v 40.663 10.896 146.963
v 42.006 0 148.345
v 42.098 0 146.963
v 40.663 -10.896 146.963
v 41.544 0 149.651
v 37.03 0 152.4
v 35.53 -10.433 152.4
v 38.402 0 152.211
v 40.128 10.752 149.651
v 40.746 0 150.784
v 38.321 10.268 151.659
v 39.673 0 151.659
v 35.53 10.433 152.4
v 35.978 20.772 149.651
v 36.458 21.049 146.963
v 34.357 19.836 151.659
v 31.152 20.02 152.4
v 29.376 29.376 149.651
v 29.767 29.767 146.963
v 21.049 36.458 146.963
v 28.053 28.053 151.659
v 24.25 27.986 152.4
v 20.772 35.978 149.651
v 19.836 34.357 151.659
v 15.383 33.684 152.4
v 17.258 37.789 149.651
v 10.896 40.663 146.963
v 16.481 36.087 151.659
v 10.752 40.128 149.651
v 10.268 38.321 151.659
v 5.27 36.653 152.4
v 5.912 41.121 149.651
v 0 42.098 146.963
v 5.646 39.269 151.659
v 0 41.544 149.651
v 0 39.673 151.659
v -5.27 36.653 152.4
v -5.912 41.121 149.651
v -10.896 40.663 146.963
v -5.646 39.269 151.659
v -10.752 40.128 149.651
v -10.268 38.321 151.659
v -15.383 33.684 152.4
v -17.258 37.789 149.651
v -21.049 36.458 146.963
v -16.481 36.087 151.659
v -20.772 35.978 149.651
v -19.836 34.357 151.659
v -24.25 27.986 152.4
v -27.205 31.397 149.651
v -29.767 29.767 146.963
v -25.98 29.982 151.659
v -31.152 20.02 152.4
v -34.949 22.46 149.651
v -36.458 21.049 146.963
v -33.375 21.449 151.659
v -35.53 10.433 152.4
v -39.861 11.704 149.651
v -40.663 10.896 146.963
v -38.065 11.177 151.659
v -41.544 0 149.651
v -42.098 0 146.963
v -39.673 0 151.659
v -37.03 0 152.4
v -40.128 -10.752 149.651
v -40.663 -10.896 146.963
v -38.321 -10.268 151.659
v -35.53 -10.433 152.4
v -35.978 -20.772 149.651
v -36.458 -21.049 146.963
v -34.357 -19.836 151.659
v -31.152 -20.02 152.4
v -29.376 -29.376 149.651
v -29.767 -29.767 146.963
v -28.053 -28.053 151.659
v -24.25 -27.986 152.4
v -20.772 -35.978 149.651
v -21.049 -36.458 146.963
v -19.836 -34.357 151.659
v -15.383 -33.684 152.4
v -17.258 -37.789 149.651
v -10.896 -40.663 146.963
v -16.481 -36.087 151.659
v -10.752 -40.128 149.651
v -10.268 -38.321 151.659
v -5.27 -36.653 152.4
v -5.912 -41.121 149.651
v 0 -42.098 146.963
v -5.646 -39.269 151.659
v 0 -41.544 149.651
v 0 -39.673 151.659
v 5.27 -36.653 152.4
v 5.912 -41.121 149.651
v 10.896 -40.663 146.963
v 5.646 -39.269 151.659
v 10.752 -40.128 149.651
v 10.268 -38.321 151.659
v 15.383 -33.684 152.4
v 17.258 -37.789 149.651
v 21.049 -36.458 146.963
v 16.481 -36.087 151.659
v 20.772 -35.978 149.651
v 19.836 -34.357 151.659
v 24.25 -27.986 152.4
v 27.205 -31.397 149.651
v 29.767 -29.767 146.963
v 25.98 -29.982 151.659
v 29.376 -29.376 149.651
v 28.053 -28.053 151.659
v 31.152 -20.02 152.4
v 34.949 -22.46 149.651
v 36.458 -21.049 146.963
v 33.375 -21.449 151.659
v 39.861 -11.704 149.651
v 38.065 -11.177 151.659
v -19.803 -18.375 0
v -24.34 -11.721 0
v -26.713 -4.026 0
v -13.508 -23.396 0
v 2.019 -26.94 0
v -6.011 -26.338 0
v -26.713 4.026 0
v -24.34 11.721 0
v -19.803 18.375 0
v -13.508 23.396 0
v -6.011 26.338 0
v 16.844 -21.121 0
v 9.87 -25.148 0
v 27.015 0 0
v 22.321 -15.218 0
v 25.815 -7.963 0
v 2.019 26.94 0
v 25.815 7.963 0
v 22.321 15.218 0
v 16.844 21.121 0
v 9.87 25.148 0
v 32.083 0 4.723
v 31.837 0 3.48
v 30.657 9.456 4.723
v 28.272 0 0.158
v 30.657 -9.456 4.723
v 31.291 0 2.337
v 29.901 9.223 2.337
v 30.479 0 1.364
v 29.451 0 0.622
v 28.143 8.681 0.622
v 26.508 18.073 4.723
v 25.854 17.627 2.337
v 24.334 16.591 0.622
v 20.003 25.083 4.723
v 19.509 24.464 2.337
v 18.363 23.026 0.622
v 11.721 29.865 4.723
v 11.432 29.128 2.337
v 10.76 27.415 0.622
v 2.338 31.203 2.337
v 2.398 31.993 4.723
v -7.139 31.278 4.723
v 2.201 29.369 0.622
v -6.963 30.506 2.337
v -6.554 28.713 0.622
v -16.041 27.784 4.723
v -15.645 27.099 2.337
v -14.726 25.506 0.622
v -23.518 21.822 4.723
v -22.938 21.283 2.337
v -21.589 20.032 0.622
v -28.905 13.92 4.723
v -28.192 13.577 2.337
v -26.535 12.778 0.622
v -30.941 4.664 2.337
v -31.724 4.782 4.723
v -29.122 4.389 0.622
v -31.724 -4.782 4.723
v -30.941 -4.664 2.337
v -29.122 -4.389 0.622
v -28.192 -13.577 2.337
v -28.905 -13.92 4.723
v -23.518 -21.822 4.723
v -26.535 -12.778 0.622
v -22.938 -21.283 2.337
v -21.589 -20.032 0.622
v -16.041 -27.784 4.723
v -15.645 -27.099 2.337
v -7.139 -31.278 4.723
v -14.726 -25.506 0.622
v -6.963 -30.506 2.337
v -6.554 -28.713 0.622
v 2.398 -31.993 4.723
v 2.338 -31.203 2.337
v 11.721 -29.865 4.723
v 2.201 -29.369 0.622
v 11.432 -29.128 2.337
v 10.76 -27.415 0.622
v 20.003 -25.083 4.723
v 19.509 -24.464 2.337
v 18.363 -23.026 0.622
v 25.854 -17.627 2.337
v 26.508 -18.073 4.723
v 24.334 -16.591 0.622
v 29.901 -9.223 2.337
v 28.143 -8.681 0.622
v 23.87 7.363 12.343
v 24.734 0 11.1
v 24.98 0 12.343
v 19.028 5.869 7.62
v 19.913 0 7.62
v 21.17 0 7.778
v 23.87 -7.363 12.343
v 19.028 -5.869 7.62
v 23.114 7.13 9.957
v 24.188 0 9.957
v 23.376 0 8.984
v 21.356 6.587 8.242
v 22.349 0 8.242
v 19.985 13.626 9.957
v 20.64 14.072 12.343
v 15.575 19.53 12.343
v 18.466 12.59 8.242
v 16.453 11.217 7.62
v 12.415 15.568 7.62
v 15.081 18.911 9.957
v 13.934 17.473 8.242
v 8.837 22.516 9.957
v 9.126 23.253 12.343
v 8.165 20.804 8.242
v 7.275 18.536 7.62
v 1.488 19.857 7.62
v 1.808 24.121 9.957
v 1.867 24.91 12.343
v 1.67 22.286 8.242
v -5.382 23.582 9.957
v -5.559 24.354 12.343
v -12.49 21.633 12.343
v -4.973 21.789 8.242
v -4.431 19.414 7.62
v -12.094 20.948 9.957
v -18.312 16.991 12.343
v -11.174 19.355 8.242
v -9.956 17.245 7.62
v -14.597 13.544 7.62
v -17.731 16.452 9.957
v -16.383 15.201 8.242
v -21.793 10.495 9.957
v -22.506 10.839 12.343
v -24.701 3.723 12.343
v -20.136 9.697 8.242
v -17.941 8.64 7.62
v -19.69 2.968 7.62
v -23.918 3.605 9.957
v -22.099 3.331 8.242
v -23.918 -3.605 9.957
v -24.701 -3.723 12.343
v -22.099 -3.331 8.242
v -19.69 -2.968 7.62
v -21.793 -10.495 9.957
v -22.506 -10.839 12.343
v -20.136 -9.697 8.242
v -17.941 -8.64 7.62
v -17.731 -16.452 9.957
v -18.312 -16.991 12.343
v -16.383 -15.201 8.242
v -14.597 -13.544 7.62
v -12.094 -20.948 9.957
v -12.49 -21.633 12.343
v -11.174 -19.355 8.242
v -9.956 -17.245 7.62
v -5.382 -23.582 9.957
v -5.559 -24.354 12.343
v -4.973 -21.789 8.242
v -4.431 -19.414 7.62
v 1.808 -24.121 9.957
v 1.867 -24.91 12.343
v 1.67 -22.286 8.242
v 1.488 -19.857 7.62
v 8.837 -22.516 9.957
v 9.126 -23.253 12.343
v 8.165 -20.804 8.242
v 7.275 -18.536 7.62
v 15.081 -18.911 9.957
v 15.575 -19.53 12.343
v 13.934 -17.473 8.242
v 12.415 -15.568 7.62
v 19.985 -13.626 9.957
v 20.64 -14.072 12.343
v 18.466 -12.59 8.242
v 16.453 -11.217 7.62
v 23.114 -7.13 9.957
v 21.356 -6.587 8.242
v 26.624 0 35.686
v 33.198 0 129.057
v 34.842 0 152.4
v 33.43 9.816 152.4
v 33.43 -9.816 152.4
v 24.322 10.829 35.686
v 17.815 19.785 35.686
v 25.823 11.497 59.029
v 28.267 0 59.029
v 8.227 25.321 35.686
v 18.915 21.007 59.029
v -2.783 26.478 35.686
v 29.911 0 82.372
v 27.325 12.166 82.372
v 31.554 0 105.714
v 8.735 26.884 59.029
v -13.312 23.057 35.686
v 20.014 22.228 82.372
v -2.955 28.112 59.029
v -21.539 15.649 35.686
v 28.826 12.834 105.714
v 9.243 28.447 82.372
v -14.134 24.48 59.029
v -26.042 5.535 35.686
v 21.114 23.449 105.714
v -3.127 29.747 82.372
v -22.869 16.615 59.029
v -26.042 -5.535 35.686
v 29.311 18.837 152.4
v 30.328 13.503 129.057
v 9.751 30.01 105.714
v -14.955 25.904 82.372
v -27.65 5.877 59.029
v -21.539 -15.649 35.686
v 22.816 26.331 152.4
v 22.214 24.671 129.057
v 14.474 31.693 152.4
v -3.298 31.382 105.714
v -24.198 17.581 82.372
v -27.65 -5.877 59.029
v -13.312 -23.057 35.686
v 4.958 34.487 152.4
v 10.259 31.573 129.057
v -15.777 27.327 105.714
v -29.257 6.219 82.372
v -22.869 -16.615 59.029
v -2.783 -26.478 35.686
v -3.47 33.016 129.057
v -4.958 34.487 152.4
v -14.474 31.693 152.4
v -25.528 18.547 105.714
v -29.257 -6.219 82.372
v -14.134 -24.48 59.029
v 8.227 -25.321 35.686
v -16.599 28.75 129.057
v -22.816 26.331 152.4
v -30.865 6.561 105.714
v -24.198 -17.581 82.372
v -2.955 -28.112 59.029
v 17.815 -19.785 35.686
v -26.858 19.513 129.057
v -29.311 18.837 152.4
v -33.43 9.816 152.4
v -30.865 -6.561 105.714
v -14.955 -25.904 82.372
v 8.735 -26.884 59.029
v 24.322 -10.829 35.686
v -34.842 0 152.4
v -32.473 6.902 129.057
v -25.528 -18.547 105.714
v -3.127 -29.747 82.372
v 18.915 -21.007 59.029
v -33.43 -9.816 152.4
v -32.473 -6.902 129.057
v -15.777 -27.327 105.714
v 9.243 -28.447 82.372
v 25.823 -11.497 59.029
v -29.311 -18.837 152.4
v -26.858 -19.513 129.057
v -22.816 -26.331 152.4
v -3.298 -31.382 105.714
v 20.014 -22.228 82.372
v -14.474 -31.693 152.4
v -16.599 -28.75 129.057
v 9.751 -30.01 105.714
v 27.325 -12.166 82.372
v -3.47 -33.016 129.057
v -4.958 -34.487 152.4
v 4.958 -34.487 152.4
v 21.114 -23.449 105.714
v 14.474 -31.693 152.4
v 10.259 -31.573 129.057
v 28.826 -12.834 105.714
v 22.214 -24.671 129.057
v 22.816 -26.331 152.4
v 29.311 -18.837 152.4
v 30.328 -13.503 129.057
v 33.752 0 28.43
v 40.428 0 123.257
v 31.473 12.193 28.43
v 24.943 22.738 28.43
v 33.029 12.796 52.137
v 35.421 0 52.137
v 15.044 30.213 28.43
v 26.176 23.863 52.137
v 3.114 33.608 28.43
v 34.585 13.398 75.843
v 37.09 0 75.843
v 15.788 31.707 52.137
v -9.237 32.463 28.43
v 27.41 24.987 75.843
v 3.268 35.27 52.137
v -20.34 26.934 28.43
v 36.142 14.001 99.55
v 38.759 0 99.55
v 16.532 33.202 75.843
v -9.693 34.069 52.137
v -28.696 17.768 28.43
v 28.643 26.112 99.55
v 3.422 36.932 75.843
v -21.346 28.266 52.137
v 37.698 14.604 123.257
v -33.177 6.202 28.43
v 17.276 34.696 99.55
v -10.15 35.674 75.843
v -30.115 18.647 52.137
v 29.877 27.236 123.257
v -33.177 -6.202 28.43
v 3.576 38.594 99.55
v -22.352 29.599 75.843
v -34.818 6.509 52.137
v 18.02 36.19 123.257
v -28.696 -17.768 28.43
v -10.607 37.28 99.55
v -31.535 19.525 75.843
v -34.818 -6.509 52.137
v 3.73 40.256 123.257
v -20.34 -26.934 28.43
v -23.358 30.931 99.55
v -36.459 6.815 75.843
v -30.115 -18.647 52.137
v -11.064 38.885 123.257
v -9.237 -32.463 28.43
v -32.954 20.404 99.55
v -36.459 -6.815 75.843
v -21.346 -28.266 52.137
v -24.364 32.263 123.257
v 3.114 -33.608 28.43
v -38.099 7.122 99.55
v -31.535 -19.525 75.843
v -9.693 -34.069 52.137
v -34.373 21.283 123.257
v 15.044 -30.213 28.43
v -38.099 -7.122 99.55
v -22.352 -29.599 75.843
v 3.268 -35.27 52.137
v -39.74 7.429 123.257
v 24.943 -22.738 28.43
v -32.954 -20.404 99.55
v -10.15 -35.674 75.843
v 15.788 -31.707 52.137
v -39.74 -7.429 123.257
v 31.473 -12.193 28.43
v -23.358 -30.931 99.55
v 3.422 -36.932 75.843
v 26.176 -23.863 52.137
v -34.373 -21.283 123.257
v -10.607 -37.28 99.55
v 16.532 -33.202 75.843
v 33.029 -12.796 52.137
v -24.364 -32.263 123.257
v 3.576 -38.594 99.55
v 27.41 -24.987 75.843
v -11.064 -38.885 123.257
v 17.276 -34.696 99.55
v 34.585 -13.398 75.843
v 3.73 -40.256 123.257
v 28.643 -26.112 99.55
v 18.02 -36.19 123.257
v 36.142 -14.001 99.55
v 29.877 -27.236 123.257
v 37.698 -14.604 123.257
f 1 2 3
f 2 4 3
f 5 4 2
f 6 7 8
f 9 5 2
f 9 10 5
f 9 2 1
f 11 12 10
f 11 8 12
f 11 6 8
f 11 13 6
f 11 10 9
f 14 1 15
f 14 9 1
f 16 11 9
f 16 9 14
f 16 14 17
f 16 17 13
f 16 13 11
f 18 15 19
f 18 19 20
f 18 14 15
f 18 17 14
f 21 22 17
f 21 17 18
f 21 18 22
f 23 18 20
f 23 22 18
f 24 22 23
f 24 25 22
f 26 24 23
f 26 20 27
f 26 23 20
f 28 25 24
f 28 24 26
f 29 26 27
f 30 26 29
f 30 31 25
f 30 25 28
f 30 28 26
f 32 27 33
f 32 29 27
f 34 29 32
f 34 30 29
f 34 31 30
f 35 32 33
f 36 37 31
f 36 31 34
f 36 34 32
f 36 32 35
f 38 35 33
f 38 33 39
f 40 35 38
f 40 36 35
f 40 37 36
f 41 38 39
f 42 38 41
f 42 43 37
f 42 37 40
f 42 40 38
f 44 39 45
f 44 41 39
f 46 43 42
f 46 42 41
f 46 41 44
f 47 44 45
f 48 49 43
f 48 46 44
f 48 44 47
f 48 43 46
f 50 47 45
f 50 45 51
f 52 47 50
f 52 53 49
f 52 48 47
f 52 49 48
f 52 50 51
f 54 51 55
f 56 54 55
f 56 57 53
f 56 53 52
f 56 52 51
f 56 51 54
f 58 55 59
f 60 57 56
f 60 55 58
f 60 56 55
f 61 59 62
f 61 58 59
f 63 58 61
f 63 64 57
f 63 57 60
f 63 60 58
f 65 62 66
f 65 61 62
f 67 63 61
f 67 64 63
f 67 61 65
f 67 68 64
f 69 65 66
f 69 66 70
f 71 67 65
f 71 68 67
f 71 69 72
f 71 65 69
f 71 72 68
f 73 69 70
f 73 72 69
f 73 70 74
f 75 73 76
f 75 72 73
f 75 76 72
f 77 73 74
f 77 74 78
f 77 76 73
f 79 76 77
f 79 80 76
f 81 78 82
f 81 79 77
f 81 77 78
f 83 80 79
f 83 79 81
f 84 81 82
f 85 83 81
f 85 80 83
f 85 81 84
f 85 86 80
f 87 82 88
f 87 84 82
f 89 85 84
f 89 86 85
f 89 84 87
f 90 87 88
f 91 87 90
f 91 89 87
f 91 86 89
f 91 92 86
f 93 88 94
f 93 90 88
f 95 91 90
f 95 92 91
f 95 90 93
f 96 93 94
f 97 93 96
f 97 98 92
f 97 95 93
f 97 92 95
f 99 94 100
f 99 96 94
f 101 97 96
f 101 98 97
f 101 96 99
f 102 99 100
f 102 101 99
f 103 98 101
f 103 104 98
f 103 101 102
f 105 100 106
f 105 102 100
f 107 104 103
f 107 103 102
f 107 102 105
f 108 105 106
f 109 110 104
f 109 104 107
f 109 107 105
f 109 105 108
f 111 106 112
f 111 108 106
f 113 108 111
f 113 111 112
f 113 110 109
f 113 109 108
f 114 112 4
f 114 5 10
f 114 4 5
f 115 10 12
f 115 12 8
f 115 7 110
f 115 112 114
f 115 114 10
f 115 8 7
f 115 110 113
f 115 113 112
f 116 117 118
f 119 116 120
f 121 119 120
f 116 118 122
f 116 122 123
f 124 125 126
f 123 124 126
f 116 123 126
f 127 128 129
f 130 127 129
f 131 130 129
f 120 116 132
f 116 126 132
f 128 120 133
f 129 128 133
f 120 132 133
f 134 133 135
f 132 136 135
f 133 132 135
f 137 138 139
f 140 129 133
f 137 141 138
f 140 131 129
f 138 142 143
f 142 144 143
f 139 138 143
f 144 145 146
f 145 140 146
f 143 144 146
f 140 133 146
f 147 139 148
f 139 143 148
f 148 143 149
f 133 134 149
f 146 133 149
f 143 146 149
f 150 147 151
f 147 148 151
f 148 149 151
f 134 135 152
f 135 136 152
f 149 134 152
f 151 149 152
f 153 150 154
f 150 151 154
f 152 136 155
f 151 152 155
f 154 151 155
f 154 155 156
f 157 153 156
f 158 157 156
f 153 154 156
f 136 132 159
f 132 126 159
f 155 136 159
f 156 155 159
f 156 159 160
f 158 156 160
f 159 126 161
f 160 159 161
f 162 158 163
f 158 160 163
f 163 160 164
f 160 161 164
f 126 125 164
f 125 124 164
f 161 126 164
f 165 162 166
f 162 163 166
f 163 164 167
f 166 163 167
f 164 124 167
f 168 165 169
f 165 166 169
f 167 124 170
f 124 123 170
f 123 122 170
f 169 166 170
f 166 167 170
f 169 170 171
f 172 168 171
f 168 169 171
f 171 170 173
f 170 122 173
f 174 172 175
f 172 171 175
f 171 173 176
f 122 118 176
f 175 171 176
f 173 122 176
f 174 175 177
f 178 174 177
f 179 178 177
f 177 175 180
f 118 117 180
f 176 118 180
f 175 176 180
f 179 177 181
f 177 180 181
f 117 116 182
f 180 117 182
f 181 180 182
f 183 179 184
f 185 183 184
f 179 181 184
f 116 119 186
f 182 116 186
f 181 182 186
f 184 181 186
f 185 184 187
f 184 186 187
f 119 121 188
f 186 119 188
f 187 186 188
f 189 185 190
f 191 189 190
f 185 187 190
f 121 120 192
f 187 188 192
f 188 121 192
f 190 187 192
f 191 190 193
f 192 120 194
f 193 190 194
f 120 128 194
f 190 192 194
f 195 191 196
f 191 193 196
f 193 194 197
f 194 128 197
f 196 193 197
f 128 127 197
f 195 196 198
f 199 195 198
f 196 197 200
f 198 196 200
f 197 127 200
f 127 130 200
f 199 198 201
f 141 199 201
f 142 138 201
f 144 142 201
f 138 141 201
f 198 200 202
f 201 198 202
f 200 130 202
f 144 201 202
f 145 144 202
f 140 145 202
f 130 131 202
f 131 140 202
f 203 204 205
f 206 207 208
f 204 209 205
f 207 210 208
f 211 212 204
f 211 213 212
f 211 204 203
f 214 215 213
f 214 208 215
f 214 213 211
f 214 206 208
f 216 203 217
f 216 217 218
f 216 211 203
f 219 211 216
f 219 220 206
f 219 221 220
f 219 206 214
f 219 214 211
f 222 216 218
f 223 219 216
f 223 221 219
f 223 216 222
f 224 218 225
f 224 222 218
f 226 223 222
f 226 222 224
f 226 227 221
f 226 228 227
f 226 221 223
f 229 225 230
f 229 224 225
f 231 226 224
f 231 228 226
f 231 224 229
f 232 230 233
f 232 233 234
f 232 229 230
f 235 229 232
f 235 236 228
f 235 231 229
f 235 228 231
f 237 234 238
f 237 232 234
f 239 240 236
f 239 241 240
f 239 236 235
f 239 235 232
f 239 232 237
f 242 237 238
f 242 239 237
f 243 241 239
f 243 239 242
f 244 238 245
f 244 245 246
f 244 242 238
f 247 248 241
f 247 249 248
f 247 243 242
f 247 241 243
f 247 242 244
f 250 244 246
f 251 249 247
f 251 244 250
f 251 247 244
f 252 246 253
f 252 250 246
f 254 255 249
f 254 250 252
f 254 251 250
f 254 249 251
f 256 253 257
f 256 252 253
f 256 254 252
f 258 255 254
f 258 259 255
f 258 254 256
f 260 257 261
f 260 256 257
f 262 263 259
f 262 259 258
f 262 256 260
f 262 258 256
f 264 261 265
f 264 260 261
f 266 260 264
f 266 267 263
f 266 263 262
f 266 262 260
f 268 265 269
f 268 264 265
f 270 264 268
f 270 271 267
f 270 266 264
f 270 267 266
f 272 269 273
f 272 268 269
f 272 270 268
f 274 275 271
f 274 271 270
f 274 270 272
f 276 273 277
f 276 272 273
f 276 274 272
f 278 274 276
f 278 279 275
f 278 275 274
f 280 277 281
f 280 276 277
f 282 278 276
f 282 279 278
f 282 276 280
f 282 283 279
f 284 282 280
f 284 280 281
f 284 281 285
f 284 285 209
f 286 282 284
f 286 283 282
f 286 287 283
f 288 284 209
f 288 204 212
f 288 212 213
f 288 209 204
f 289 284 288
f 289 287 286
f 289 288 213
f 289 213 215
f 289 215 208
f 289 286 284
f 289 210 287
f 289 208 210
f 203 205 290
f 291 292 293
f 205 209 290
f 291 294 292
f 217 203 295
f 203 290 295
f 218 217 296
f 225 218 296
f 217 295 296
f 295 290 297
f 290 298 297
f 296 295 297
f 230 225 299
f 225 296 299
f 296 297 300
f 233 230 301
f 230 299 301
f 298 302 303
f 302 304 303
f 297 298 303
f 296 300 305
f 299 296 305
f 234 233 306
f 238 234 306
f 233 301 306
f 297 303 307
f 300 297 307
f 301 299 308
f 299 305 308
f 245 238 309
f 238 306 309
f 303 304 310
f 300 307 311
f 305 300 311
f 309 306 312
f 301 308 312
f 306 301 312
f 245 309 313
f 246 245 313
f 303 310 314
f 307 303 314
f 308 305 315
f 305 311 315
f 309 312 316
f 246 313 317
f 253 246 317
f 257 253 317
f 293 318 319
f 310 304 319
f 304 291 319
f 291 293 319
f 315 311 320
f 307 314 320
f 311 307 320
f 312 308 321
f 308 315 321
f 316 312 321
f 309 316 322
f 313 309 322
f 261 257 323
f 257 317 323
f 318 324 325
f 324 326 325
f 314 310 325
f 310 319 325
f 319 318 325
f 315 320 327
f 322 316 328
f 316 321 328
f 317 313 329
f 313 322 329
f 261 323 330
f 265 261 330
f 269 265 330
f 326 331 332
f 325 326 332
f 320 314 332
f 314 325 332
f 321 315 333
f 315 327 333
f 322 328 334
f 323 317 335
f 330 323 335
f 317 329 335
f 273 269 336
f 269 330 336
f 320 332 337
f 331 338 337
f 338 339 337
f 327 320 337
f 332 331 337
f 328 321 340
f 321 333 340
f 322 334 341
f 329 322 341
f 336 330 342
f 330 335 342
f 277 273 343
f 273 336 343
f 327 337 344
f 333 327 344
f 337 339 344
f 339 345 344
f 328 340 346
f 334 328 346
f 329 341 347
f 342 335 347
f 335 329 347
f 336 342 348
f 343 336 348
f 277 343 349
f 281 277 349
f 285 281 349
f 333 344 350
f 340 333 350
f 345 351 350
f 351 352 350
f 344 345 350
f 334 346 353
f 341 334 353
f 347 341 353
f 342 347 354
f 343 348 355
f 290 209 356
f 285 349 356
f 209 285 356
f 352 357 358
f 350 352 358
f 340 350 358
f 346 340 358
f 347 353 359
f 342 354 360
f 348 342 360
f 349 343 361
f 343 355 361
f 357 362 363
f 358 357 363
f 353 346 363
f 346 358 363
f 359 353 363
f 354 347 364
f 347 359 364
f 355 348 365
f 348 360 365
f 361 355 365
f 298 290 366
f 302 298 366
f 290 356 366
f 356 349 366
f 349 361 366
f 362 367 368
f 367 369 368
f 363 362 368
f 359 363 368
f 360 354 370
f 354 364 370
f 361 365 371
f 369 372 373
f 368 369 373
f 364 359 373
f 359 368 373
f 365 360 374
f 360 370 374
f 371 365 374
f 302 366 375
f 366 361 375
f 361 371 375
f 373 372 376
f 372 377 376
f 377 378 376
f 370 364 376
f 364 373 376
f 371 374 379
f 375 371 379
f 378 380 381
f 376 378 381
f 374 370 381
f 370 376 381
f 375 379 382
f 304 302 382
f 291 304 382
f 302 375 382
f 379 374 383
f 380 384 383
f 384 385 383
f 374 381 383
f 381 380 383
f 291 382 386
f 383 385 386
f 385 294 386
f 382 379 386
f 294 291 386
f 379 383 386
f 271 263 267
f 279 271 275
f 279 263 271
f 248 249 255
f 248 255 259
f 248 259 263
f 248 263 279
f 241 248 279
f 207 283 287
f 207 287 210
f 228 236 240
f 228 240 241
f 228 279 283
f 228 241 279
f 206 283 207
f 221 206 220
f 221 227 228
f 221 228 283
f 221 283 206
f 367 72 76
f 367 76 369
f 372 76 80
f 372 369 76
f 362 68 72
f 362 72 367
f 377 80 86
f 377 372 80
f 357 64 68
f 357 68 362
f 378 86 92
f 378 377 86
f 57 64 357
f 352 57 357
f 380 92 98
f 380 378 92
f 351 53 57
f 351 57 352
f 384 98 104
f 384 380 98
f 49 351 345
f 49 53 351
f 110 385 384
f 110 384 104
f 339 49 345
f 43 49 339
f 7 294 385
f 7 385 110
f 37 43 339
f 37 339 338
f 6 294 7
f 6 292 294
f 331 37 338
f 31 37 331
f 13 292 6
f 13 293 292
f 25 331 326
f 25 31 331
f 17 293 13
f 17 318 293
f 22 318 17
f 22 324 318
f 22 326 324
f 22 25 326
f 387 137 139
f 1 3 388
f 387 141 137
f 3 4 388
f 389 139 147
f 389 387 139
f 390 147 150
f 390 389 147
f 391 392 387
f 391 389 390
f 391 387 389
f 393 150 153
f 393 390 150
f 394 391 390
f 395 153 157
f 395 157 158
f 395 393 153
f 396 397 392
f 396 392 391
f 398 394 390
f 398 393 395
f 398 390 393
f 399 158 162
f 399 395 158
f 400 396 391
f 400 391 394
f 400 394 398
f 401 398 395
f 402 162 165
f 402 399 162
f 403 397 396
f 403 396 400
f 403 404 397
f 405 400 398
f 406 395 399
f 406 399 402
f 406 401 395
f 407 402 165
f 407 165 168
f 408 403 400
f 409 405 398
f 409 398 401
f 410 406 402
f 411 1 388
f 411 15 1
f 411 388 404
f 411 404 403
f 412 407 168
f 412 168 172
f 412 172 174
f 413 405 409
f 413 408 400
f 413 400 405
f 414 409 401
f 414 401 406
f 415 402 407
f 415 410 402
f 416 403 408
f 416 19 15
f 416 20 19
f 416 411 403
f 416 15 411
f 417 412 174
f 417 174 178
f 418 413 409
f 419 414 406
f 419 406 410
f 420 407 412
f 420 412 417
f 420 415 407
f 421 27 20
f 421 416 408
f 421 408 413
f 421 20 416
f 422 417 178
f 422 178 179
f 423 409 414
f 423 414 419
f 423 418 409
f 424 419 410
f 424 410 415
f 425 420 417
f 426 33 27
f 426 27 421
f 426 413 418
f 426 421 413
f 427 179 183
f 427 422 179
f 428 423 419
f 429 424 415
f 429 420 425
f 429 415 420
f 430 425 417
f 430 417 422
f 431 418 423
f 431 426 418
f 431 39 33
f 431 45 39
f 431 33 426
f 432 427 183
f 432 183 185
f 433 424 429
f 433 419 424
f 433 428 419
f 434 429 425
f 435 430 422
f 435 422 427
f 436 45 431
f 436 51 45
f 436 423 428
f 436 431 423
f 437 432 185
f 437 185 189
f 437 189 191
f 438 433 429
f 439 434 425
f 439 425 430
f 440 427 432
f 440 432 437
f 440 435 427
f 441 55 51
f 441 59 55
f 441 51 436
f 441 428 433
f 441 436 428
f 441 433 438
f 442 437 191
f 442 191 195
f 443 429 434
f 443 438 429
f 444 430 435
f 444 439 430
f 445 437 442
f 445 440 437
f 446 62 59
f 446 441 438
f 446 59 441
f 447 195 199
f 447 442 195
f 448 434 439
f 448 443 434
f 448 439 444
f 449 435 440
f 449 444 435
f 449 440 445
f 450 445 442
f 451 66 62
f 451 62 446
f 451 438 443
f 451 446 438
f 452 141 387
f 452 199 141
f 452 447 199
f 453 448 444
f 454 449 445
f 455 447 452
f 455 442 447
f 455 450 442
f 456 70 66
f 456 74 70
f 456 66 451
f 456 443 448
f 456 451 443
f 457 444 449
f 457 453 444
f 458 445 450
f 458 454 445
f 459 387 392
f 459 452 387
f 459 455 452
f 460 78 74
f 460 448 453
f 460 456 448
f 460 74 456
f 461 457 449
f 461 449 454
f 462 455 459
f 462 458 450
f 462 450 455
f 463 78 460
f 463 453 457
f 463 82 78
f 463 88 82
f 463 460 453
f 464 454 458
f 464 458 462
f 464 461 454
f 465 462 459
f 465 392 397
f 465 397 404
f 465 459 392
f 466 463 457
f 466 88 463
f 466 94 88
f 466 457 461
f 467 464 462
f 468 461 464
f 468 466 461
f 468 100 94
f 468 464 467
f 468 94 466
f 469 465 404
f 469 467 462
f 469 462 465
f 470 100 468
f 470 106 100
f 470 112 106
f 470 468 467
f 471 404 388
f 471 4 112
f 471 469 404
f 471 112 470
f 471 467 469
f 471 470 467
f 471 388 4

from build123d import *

# Parameters (mm, degrees)
F0_R = 31.75
F2_R = 42.4803799305
F4_T = -7.62
F5_R = 5.08
F6_R = 5.08
F7_R = 5.08


with BuildPart() as f3:
    # F0 (on Top) → F3 section 0
    with BuildSketch(Plane.XY):
        Circle(F0_R)
    # F2 (on offset) → F3 section 1
    with BuildSketch(Plane.XY.offset(152.4)):
        Circle(F2_R)
    loft()

    # F4
    f4_openings = [f3.faces().sort_by_distance(p)[0] for p in [
        (0, 0, 152.4),
    ]]
    offset(amount=F4_T, openings=f4_openings, kind=Kind.INTERSECTION)

    # F5
    f5_edges = [f3.edges().sort_by_distance(p)[0] for p in [
        (-42.48038, 0, 152.4),
    ]]
    fillet(f5_edges, radius=F5_R)

    # F6
    f6_edges = [f3.edges().sort_by_distance(p)[0] for p in [
        (-31.75, 0, 0),
    ]]
    fillet(f6_edges, radius=F6_R)

    # F7
    f7_edges = [f3.edges().sort_by_distance(p)[0] for p in [
        (-24.647654, 0, 7.62),
    ]]
    fillet(f7_edges, radius=F7_R)


solid = f3.part
